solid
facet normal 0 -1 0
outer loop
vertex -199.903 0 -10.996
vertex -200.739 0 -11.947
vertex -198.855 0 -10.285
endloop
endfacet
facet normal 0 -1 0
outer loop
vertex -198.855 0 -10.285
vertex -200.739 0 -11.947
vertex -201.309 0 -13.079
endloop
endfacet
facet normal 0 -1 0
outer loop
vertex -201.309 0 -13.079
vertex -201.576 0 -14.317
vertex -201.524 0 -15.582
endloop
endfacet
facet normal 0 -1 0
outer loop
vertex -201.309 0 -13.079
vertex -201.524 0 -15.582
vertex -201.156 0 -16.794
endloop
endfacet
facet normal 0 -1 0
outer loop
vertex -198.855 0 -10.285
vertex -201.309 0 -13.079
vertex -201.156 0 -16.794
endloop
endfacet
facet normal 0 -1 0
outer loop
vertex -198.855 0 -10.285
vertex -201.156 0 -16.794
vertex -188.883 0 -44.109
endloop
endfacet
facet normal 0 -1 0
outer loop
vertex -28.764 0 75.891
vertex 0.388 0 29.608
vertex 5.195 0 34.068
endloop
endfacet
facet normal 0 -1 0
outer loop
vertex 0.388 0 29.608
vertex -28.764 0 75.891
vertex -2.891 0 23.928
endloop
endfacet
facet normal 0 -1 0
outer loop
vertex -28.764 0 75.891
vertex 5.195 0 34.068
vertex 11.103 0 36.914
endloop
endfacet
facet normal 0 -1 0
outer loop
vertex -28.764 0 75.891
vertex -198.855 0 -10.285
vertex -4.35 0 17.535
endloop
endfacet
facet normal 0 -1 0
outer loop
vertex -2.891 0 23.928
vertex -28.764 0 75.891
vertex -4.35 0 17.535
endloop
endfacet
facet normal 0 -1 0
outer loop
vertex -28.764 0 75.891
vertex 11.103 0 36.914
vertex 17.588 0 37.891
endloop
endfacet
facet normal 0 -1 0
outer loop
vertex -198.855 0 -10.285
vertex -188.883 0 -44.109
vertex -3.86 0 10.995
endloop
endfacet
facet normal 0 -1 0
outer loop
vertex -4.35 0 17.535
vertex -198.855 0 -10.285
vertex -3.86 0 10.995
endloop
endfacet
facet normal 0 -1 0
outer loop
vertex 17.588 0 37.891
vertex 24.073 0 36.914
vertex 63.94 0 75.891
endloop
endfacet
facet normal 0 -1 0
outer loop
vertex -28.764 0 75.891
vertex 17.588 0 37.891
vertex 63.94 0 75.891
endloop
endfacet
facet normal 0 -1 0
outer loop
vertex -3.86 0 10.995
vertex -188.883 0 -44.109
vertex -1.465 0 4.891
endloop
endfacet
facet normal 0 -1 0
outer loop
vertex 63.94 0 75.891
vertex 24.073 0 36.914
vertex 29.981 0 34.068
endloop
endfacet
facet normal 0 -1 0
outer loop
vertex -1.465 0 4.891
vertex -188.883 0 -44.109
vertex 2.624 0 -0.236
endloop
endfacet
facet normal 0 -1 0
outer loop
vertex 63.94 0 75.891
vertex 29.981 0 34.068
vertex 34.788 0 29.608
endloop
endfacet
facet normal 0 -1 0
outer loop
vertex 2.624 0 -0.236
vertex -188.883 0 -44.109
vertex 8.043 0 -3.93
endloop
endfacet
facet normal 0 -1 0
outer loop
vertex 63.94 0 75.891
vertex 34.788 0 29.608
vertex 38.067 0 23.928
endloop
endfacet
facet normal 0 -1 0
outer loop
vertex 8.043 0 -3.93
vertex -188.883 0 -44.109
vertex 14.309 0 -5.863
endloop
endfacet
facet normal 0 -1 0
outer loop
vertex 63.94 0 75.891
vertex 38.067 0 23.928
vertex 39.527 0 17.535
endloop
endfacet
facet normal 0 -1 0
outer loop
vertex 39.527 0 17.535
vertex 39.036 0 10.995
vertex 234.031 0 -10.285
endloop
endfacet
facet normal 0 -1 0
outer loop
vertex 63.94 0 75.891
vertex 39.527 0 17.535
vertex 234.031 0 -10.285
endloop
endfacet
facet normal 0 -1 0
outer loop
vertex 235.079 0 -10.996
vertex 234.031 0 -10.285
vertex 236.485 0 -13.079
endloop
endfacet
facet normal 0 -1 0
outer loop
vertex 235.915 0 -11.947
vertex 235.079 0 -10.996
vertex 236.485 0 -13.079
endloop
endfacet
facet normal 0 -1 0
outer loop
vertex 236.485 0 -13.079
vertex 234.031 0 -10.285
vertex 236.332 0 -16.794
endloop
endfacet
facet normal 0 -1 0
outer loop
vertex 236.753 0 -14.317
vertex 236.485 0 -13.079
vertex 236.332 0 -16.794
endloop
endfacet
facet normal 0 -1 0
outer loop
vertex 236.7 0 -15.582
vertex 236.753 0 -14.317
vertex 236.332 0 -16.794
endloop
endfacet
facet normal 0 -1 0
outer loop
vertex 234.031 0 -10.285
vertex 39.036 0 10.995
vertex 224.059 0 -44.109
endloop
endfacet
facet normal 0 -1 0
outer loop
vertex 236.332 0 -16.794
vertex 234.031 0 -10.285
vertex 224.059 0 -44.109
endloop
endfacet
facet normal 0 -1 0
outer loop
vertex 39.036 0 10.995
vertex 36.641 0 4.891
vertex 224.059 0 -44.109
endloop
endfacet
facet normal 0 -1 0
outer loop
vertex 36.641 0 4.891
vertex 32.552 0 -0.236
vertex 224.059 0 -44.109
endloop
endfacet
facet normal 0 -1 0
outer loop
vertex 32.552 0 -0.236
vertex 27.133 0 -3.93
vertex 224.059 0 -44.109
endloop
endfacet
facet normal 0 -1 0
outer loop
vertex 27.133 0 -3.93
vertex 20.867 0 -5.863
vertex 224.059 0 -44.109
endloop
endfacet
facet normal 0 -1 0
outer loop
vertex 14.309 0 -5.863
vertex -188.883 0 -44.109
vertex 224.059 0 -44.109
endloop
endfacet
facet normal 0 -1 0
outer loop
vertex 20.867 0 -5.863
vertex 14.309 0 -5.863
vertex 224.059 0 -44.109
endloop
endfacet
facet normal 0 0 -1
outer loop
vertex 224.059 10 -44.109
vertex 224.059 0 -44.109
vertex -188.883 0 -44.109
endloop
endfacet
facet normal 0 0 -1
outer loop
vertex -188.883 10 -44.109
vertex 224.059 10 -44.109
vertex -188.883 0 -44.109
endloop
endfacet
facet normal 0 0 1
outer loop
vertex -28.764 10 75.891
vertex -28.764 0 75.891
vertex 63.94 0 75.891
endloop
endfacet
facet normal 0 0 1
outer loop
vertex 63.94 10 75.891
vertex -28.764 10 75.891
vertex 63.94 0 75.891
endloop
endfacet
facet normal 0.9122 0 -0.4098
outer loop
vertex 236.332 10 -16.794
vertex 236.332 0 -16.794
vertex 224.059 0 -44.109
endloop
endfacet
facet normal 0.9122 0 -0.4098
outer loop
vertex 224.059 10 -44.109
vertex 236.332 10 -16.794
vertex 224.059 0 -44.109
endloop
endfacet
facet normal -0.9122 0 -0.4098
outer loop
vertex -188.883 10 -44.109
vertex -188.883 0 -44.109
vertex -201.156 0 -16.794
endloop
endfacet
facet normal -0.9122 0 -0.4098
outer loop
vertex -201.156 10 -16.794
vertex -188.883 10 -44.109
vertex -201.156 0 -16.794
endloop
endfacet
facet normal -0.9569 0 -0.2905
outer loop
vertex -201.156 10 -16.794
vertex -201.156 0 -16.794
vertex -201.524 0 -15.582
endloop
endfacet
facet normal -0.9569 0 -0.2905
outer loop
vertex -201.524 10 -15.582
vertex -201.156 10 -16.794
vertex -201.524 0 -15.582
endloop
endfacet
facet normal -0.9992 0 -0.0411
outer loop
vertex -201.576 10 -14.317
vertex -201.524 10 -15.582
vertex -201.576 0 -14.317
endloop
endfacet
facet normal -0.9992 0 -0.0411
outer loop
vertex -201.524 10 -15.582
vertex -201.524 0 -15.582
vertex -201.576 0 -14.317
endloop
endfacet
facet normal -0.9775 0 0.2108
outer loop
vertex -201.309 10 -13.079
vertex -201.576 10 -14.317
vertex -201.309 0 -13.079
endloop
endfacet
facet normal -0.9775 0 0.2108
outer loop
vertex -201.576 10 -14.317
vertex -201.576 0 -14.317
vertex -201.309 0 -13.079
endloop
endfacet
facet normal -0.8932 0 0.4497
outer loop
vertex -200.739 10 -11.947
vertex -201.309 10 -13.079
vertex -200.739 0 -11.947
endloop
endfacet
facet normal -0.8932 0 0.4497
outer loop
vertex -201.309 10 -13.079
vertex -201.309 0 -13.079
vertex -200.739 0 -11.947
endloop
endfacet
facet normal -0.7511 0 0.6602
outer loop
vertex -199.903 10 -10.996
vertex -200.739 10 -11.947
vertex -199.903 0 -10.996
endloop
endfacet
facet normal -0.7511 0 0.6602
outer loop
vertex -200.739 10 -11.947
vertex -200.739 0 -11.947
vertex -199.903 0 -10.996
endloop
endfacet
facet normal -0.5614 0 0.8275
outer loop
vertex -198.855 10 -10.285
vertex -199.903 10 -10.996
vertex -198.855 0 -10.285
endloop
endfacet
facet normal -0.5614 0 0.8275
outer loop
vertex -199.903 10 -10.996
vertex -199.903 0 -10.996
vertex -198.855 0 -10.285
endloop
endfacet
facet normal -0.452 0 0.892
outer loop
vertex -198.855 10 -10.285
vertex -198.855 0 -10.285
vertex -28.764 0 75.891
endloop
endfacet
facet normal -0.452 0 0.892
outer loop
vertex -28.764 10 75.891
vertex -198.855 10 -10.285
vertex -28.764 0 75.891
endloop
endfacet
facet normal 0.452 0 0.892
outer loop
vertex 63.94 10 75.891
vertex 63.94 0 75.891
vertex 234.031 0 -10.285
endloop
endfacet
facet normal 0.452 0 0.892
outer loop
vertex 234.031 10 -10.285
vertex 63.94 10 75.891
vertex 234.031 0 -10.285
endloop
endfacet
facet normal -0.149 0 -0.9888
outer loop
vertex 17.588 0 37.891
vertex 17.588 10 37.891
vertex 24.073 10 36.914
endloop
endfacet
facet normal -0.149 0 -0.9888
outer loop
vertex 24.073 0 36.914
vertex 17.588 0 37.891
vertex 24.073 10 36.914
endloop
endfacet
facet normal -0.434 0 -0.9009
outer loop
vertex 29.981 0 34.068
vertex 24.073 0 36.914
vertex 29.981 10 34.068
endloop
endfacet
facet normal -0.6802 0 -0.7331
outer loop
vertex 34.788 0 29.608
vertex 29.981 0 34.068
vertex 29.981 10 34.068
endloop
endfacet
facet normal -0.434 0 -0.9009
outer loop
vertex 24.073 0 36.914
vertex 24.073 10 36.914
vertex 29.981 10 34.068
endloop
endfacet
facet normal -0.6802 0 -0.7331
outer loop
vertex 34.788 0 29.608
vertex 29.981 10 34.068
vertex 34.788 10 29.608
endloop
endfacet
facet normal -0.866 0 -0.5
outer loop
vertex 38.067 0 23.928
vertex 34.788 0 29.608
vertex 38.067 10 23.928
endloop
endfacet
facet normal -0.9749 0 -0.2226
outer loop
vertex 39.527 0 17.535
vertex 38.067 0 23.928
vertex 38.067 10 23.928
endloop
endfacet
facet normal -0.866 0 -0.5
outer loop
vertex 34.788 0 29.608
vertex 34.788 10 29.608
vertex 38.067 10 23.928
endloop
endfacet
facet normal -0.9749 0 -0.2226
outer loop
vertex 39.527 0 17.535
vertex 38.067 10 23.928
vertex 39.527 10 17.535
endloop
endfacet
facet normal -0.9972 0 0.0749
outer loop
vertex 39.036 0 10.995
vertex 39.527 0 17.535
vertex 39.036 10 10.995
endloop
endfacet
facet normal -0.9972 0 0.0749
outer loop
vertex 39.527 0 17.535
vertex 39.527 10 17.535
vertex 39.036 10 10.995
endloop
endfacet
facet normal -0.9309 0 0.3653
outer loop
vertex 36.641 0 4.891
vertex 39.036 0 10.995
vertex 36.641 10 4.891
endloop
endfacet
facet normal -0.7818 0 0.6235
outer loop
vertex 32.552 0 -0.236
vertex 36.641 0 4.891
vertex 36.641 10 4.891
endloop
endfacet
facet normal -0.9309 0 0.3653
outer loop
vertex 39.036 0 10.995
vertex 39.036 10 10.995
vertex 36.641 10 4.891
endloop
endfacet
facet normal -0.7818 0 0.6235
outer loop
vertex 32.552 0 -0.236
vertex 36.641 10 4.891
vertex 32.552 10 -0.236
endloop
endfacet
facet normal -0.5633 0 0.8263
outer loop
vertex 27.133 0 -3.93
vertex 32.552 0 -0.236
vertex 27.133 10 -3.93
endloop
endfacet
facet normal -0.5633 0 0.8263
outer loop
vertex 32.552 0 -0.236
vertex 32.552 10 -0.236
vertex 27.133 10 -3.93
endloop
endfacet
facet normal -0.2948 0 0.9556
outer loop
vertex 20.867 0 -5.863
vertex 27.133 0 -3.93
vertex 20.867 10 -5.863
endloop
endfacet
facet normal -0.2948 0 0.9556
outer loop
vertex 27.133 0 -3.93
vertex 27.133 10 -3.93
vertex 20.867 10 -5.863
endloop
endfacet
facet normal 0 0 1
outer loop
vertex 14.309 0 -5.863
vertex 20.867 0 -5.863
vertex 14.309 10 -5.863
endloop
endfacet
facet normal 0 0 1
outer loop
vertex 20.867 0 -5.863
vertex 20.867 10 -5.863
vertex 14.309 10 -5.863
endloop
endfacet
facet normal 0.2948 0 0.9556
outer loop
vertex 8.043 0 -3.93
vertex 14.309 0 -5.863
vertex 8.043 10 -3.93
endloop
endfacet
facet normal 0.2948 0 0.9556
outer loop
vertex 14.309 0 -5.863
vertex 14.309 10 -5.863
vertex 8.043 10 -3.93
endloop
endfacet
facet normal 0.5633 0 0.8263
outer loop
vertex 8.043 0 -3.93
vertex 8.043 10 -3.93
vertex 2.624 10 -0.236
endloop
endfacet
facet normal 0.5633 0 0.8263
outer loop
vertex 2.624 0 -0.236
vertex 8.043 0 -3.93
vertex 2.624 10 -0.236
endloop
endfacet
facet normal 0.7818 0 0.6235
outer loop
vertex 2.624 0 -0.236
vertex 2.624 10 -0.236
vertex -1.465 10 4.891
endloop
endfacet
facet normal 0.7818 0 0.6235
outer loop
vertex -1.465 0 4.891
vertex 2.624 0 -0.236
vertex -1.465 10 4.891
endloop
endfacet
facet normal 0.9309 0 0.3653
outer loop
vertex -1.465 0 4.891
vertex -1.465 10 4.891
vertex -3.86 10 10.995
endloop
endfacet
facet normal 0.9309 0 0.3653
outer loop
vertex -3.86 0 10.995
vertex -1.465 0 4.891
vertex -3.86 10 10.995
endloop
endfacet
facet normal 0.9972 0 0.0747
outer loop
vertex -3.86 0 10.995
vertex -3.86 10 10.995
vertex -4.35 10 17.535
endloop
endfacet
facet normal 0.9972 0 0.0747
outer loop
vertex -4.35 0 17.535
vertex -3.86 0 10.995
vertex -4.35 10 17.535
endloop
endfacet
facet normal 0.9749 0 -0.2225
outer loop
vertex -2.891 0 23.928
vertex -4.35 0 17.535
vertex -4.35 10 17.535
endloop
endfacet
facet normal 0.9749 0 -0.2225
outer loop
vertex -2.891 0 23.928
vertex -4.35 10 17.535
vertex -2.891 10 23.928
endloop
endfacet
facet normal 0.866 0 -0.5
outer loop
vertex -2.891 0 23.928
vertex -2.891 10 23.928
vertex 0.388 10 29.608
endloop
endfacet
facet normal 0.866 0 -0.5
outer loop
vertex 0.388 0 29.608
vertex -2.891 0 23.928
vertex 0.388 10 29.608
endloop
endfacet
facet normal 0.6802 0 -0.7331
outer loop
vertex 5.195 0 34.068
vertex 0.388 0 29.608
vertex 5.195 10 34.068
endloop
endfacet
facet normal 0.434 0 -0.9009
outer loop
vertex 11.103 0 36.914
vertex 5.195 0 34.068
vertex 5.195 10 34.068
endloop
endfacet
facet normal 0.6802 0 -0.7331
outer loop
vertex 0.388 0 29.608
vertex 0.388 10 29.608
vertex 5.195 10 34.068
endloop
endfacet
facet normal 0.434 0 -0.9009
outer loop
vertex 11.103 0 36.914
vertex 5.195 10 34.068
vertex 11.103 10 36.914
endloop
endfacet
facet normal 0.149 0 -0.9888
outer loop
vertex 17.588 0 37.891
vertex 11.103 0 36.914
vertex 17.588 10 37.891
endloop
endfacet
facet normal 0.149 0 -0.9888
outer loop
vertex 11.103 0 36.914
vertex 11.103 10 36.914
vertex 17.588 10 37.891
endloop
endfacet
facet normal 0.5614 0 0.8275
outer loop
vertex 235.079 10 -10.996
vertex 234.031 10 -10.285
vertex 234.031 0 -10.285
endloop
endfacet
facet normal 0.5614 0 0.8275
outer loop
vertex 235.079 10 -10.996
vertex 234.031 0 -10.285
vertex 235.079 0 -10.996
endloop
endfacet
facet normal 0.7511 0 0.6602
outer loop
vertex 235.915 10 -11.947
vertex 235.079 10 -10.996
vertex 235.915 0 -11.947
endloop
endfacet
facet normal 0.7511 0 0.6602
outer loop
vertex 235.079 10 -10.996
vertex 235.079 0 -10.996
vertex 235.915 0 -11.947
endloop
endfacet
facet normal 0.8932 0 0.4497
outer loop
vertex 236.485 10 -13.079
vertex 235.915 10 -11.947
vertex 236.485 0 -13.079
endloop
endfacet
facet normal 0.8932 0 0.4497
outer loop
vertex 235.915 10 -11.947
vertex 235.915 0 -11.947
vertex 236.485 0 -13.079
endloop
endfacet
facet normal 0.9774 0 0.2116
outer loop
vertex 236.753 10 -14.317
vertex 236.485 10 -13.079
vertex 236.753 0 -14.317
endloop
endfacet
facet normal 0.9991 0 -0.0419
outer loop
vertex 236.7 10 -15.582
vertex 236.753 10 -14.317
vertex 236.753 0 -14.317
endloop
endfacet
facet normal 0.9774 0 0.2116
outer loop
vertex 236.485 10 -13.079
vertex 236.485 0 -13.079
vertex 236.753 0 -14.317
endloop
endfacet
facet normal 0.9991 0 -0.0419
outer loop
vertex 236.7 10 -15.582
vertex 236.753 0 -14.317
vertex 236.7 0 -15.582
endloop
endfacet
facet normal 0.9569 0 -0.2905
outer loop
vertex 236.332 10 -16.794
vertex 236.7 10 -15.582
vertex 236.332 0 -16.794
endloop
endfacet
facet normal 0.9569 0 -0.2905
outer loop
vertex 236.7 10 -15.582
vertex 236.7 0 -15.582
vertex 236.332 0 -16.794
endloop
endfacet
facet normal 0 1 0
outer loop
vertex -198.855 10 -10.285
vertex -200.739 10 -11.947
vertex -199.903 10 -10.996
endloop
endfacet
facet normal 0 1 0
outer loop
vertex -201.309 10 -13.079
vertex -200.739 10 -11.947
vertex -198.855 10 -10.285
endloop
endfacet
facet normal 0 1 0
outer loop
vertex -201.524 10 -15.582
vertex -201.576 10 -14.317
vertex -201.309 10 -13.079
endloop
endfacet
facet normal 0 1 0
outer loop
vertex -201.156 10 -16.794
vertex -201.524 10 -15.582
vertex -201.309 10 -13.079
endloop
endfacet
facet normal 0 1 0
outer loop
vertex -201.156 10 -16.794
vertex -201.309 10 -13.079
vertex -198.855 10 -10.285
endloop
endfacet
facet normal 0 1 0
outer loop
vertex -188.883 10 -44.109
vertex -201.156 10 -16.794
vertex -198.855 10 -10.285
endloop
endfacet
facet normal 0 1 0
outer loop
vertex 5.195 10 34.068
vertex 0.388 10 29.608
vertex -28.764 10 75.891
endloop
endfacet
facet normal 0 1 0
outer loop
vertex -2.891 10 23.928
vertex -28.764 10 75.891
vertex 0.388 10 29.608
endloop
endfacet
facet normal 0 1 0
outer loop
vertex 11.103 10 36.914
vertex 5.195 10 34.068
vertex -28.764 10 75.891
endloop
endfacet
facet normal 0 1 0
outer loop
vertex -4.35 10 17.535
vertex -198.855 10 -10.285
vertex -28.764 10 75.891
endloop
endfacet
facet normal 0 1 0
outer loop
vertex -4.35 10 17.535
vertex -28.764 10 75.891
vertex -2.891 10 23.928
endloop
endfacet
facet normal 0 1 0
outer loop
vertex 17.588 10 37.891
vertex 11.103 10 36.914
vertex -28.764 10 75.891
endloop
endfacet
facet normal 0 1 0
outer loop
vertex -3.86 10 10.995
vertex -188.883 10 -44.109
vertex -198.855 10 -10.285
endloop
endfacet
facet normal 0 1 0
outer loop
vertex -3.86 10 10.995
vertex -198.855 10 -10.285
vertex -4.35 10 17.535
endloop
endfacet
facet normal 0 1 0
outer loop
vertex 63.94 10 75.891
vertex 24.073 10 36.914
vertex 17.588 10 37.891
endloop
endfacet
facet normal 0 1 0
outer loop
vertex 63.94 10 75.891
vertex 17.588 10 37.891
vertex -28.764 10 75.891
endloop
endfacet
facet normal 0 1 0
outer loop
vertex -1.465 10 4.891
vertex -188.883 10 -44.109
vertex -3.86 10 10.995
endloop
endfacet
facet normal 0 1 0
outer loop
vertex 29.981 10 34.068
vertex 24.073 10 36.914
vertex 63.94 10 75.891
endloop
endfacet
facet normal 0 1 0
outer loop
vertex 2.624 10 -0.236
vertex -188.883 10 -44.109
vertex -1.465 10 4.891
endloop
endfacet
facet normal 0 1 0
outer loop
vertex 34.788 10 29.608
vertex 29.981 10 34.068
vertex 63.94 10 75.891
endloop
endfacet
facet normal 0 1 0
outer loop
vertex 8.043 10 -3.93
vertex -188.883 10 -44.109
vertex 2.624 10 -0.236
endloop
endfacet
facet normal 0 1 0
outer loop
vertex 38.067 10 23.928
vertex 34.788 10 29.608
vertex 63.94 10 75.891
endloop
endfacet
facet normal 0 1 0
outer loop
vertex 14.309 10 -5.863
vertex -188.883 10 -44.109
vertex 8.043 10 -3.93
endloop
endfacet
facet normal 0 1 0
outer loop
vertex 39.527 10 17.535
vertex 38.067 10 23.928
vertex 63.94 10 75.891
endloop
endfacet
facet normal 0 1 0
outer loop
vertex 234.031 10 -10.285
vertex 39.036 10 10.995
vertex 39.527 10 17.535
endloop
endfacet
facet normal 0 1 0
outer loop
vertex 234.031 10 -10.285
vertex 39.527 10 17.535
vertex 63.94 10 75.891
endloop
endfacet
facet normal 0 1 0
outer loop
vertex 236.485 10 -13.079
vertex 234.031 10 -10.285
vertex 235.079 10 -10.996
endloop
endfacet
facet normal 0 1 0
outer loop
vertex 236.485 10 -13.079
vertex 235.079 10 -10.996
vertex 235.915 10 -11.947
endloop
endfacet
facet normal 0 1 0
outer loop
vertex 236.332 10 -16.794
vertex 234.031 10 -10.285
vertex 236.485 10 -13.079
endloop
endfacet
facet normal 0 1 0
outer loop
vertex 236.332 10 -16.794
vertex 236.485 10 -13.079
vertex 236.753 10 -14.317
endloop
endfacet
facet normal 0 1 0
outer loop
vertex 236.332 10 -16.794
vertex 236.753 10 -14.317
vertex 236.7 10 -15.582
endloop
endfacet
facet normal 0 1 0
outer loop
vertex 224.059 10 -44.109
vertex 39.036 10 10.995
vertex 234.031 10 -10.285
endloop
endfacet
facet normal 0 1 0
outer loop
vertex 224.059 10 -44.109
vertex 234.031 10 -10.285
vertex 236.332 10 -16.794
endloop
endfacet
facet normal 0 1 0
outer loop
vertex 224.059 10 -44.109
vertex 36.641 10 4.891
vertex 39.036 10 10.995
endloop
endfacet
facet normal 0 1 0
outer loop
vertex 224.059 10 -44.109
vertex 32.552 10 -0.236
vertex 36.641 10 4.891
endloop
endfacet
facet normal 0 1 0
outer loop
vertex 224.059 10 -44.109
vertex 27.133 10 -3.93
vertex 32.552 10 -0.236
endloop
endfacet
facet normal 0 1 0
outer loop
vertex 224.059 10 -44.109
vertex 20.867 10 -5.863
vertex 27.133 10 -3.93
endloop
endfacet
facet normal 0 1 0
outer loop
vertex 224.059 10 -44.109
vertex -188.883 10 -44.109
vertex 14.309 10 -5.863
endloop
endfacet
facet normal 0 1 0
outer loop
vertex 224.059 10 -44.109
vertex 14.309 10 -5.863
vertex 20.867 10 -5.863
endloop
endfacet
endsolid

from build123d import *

# Parameters (mm, degrees)
BOSS_EXTRUDE1_DEPTH = 10
SKETCH2_R           = 22
CUT_EXTRUDE1_DEPTH  = 10


with BuildPart() as part:
    # Sketch1 → Boss-Extrude1 (new body)
    with BuildSketch(Plane(origin=(0, 0, 0), x_dir=(1, 0, 0), z_dir=(0, 1, 0))):
        with BuildLine():
            Line((224.059047254, 44.109057501), (-188.882980363, 44.109057501))
            Line((-188.882980363, 44.109057501), (-201.155616653, 16.794241143))
            ThreePointArc((-201.155616653, 16.794241143), (-201.308951392, 13.078635624), (-198.854573143, 10.28484549))
            Line((-198.854573143, 10.28484549), (-28.764010839, -75.890942499))
            Line((-28.764010839, -75.890942499), (17.588033446, -75.890942499))
            Line((17.588033446, -75.890942499), (63.94007773, -75.890942499))
            Line((63.94007773, -75.890942499), (234.030640034, 10.28484549))
            ThreePointArc((234.030640034, 10.28484549), (236.485018284, 13.078635624), (236.331683544, 16.794241143))
            Line((236.331683544, 16.794241143), (224.059047254, 44.109057501))
        make_face()
    extrude(amount=BOSS_EXTRUDE1_DEPTH)

    # Sketch2 → Cut-Extrude1 (cut)
    with BuildSketch(Plane(origin=(0, 10, 0), x_dir=(1, 0, 0), z_dir=(0, 1, 0))):
        with Locations(Location((17.588033446, -15.890942499, 0), (0, 0, 270))):
            Circle(SKETCH2_R)
    extrude(amount=-CUT_EXTRUDE1_DEPTH, mode=Mode.SUBTRACT)


solid = part.part
